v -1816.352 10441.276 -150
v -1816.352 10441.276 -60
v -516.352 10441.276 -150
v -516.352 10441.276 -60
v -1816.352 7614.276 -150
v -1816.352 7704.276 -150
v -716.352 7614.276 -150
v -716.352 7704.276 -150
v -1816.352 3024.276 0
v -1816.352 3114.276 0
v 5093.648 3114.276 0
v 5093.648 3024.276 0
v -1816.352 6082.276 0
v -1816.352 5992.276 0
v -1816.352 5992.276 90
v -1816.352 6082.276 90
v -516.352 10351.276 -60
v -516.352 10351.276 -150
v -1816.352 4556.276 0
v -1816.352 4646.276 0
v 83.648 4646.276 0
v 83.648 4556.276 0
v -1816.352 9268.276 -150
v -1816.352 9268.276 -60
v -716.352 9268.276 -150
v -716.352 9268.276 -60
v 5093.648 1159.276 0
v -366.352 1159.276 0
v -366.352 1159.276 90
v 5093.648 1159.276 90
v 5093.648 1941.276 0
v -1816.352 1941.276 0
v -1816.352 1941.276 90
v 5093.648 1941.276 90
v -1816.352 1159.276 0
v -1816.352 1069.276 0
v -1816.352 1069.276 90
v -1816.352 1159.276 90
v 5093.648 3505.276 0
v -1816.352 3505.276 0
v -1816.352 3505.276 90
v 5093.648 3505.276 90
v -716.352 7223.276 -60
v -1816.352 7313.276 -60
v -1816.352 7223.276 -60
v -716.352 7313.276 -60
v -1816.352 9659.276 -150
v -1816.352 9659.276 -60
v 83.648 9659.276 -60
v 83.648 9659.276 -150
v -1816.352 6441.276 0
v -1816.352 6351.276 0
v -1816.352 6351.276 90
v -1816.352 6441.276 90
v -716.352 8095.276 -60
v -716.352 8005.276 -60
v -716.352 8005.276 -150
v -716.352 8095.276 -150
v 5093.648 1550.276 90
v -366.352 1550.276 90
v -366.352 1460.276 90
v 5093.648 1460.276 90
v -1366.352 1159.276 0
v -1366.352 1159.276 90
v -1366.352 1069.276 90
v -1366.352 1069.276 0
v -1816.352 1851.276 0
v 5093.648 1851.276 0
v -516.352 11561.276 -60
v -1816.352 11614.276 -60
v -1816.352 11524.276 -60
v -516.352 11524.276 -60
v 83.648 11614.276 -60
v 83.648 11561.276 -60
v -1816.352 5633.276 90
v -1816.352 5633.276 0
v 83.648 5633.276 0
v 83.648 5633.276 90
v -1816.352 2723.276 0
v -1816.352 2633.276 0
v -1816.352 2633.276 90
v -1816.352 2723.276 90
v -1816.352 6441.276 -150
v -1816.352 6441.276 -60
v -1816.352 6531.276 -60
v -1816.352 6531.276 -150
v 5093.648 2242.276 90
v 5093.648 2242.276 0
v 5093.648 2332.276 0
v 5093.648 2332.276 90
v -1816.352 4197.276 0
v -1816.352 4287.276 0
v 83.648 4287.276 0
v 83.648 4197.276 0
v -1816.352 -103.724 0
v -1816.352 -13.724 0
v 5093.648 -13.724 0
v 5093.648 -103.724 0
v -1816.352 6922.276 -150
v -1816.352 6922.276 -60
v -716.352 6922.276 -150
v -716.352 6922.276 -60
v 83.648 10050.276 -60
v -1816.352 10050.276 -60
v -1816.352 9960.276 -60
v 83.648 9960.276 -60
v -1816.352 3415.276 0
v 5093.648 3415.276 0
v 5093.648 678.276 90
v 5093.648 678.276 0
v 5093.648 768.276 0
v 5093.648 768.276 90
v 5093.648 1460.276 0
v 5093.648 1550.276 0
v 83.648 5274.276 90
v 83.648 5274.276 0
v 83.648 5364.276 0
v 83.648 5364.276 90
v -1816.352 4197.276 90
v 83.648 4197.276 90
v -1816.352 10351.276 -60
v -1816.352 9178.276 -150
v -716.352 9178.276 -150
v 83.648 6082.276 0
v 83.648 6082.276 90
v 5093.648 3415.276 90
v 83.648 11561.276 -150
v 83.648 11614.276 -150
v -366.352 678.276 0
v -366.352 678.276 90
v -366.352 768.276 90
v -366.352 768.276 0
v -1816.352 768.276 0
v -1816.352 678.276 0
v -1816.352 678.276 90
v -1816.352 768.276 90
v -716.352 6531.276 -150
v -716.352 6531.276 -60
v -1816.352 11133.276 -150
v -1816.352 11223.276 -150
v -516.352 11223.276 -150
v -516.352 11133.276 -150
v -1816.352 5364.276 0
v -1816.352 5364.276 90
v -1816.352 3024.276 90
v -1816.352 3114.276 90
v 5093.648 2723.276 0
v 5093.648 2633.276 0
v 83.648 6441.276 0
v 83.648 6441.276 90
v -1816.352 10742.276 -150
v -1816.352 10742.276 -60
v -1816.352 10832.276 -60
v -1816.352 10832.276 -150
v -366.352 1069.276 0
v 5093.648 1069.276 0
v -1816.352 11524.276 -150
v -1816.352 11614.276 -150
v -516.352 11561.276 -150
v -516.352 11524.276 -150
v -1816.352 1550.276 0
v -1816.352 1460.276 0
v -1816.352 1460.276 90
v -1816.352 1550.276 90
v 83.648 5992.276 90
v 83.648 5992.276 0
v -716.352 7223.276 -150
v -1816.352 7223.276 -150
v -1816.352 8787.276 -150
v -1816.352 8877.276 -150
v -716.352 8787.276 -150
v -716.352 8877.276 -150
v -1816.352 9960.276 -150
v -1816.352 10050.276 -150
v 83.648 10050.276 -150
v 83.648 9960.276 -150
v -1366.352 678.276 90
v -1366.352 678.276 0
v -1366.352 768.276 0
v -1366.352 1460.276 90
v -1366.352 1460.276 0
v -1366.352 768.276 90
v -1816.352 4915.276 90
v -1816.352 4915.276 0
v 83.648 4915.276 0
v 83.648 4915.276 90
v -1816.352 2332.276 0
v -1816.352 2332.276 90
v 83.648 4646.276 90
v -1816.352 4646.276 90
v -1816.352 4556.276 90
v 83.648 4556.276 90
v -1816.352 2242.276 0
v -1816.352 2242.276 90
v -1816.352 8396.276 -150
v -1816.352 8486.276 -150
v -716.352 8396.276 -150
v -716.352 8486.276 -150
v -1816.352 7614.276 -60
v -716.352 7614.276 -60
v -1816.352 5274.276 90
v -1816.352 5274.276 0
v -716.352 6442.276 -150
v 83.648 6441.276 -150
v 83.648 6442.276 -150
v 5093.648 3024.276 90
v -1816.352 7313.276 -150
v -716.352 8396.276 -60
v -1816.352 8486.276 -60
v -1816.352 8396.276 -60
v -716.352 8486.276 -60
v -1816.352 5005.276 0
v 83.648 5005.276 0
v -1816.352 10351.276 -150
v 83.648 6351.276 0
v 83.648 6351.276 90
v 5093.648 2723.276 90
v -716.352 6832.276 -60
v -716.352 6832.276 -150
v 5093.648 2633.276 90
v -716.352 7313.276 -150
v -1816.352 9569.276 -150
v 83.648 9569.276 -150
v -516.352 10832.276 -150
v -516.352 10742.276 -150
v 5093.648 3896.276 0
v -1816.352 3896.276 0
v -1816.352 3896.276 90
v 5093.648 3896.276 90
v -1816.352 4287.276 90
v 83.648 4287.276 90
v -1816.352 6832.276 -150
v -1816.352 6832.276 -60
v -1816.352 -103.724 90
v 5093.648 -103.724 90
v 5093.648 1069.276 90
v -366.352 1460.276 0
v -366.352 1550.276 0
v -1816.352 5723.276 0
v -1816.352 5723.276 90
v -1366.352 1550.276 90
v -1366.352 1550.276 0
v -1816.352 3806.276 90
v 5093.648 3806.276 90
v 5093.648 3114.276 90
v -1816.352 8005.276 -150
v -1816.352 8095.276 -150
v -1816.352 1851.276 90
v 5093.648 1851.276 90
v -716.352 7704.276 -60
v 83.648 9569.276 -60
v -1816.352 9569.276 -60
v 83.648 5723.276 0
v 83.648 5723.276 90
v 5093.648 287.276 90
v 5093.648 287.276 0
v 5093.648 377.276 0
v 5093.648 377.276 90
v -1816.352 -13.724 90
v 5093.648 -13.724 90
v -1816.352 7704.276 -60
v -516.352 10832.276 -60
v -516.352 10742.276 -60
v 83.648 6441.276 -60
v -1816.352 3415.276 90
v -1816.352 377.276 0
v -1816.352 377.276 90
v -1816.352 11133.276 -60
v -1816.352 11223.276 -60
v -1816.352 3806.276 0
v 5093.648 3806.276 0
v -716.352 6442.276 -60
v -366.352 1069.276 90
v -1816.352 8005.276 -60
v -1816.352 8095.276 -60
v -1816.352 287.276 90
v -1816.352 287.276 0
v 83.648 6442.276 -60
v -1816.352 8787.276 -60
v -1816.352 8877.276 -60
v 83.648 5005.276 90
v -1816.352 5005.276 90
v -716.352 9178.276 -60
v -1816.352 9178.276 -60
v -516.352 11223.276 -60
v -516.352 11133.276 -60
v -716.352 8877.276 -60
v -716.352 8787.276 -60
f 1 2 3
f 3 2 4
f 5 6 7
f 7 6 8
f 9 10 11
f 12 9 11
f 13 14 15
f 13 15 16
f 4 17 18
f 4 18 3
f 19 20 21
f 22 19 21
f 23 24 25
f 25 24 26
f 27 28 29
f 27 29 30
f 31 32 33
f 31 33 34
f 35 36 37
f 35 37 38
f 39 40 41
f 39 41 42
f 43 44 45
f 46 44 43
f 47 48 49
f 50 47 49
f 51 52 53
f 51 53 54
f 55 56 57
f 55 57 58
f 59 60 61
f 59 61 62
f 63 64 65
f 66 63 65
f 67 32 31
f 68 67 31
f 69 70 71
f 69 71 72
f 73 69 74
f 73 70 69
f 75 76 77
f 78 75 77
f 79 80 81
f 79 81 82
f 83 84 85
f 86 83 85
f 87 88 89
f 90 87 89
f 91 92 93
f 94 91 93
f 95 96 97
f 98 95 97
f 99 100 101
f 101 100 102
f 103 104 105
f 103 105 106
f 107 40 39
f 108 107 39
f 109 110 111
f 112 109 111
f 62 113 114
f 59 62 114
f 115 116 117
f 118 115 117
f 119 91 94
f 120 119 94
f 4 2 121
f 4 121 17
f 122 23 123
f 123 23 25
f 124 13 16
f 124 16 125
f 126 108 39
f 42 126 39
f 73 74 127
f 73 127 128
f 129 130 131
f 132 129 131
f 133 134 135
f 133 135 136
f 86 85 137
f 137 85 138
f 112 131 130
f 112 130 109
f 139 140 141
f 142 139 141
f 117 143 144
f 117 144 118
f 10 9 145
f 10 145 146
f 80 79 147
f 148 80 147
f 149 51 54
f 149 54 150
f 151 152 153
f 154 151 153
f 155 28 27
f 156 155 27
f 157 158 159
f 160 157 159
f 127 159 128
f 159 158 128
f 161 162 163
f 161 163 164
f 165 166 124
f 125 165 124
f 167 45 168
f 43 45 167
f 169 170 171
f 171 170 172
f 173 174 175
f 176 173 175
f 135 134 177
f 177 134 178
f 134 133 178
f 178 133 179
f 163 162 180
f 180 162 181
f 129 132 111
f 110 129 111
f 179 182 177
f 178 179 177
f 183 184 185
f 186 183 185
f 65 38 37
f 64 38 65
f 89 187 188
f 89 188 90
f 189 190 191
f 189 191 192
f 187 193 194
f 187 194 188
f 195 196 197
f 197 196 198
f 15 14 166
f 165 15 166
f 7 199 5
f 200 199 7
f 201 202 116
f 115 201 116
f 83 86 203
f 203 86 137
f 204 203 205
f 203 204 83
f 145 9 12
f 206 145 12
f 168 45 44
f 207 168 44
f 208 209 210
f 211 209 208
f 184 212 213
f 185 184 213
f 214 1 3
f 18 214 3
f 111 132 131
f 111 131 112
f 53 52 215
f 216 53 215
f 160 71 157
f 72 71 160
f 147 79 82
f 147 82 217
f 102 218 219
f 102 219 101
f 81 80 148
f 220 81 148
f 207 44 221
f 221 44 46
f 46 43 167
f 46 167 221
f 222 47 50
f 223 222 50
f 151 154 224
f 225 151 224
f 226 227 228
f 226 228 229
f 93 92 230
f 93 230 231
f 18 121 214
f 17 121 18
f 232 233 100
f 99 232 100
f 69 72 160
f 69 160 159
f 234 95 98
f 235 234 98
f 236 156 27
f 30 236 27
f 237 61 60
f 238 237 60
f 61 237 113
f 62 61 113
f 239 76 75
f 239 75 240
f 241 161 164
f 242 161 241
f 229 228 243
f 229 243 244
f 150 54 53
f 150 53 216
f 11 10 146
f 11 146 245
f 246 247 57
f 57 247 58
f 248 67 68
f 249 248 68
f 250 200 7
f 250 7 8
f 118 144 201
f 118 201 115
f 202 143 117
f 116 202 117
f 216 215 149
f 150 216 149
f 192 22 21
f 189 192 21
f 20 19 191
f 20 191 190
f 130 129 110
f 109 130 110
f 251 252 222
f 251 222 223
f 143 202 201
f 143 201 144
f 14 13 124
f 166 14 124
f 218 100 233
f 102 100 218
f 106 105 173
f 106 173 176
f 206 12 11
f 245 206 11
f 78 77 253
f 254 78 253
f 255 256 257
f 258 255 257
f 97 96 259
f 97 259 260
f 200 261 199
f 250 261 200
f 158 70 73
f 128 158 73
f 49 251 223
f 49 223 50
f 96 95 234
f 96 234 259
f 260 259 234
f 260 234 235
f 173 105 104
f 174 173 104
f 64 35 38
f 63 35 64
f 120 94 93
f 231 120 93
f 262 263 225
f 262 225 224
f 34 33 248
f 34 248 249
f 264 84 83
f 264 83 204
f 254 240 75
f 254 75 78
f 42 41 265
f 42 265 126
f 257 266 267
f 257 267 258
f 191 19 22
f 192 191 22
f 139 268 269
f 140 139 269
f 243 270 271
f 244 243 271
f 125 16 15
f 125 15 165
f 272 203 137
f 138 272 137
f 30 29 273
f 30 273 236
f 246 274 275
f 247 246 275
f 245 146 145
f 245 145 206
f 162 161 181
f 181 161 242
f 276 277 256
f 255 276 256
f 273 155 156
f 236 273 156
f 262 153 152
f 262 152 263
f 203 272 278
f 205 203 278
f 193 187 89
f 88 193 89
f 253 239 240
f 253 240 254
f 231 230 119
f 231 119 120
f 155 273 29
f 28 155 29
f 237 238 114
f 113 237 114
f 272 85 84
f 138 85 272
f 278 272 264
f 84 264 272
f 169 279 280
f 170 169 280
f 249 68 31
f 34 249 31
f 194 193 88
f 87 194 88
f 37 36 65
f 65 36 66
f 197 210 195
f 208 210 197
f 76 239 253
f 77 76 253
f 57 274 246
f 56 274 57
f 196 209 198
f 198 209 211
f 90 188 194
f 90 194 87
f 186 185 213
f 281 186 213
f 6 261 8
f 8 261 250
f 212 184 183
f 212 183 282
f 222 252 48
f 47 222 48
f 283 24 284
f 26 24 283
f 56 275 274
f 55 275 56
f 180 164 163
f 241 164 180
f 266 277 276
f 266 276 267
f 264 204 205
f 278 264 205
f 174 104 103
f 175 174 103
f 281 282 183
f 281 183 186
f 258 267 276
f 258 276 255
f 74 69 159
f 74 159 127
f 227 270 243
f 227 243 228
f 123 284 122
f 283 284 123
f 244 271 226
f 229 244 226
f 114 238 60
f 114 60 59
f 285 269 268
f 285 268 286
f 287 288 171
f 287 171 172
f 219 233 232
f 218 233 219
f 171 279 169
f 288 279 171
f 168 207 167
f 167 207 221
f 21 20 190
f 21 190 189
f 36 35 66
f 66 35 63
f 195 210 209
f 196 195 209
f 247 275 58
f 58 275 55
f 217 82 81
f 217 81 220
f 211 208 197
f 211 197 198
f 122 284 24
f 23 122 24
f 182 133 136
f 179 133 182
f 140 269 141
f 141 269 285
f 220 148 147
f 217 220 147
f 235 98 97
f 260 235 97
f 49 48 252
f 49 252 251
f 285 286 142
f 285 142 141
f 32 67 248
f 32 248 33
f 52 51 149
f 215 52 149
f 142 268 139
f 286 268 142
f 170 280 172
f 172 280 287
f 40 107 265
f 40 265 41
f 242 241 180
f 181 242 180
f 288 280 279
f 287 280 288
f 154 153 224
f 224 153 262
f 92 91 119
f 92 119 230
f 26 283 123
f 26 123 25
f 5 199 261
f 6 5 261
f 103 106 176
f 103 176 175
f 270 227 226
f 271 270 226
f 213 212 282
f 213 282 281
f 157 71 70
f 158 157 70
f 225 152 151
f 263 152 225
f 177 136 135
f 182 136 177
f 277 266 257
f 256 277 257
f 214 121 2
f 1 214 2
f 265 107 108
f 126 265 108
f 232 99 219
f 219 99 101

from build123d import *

# Parameters (mm, degrees)
F0_W     = 1900
F0_H     = 90
F1_DEPTH = 90
F0_W_2   = 6910
F2_START = -60
F2_DEPTH = 90
F3_W     = 1000
F3_H     = 687
F3_H_2   = 673
F3_W_2   = 800
F3_H_3   = 3110
F3_W_3   = 600
F3_H_4   = 1300
F3_H_5   = 90
F4_DEPTH = 1000


with BuildPart() as f1:
    # F0 (on Top) → F1 (new body)
    with BuildSketch(Plane.XY):
        with Locations((-866.352162238, 6396.2760958672)):
            Rectangle(F0_W, F0_H)
    extrude(amount=F1_DEPTH)


with BuildPart() as f1b:
    # F0 (on Top) → F1, piece 2 (new body)
    with BuildSketch(Plane.XY):
        with Locations((-866.352162238, 6037.2760958672)):
            Rectangle(F0_W, F0_H)
    extrude(amount=F1_DEPTH)


with BuildPart() as f1c:
    # F0 (on Top) → F1, piece 3 (new body)
    with BuildSketch(Plane.XY):
        with Locations((-866.352162238, 5678.2760958672)):
            Rectangle(F0_W, F0_H)
    extrude(amount=F1_DEPTH)


with BuildPart() as f1d:
    # F0 (on Top) → F1, piece 4 (new body)
    with BuildSketch(Plane.XY):
        with Locations((-866.352162238, 5319.2760958672)):
            Rectangle(F0_W, F0_H)
    extrude(amount=F1_DEPTH)


with BuildPart() as f1e:
    # F0 (on Top) → F1, piece 5 (new body)
    with BuildSketch(Plane.XY):
        with Locations((-866.352162238, 4960.2760958672)):
            Rectangle(F0_W, F0_H)
    extrude(amount=F1_DEPTH)


with BuildPart() as f1f:
    # F0 (on Top) → F1, piece 6 (new body)
    with BuildSketch(Plane.XY):
        with Locations((-866.352162238, 4601.2760958672)):
            Rectangle(F0_W, F0_H)
    extrude(amount=F1_DEPTH)


with BuildPart() as f1g:
    # F0 (on Top) → F1, piece 7 (new body)
    with BuildSketch(Plane.XY):
        with Locations((-866.352162238, 4242.2760958672)):
            Rectangle(F0_W, F0_H)
    extrude(amount=F1_DEPTH)


with BuildPart() as f1h:
    # F0 (on Top) → F1, piece 8 (new body)
    with BuildSketch(Plane.XY):
        with Locations((1638.647837762, 3851.2760958672)):
            Rectangle(F0_W_2, F0_H)
    extrude(amount=F1_DEPTH)


with BuildPart() as f1i:
    # F0 (on Top) → F1, piece 9 (new body)
    with BuildSketch(Plane.XY):
        with Locations((1638.647837762, 3460.2760958672)):
            Rectangle(F0_W_2, F0_H)
    extrude(amount=F1_DEPTH)


with BuildPart() as f1j:
    # F0 (on Top) → F1, piece 10 (new body)
    with BuildSketch(Plane.XY):
        with Locations((1638.647837762, 3069.2760958672)):
            Rectangle(F0_W_2, F0_H)
    extrude(amount=F1_DEPTH)


with BuildPart() as f1k:
    # F0 (on Top) → F1, piece 11 (new body)
    with BuildSketch(Plane.XY):
        with Locations((1638.647837762, 2678.2760958672)):
            Rectangle(F0_W_2, F0_H)
    extrude(amount=F1_DEPTH)


with BuildPart() as f1l:
    # F0 (on Top) → F1, piece 12 (new body)
    with BuildSketch(Plane.XY):
        with Locations((1638.647837762, 2287.2760958672)):
            Rectangle(F0_W_2, F0_H)
    extrude(amount=F1_DEPTH)


with BuildPart() as f1m:
    # F0 (on Top) → F1, piece 13 (new body)
    with BuildSketch(Plane.XY):
        with Locations((1638.647837762, 1896.2760958672)):
            Rectangle(F0_W_2, F0_H)
    extrude(amount=F1_DEPTH)


with BuildPart() as f1n:
    # F0 (on Top) → F1, piece 14 (new body)
    with BuildSketch(Plane.XY):
        with Locations((1638.647837762, 1505.2760958672)):
            Rectangle(F0_W_2, F0_H)
    extrude(amount=F1_DEPTH)


with BuildPart() as f1o:
    # F0 (on Top) → F1, piece 15 (new body)
    with BuildSketch(Plane.XY):
        with Locations((1638.647837762, 1114.2760958672)):
            Rectangle(F0_W_2, F0_H)
    extrude(amount=F1_DEPTH)


with BuildPart() as f1p:
    # F0 (on Top) → F1, piece 16 (new body)
    with BuildSketch(Plane.XY):
        with Locations((1638.647837762, 723.2760958672)):
            Rectangle(F0_W_2, F0_H)
    extrude(amount=F1_DEPTH)


with BuildPart() as f1q:
    # F0 (on Top) → F1, piece 17 (new body)
    with BuildSketch(Plane.XY):
        with Locations((1638.647837762, 332.2760958672)):
            Rectangle(F0_W_2, F0_H)
    extrude(amount=F1_DEPTH)


with BuildPart() as f1r:
    # F0 (on Top) → F1, piece 18 (new body)
    with BuildSketch(Plane.XY):
        with Locations((1638.647837762, -58.7239041328)):
            Rectangle(F0_W_2, F0_H)
    extrude(amount=F1_DEPTH)


with BuildPart() as f2:
    # F0 (on Top) → F2 (new body)
    with BuildSketch(Plane.XY.offset(F2_START)):
        with Locations((-866.352162238, 6486.2760958672)):
            Rectangle(F0_W, F0_H)
    extrude(amount=-F2_DEPTH)


with BuildPart() as f2b:
    # F0 (on Top) → F2, piece 2 (new body)
    with BuildSketch(Plane.XY.offset(F2_START)):
        with Locations((-866.352162238, 6877.2760958672)):
            Rectangle(F0_W, F0_H)
    extrude(amount=-F2_DEPTH)


with BuildPart() as f2c:
    # F0 (on Top) → F2, piece 3 (new body)
    with BuildSketch(Plane.XY.offset(F2_START)):
        with Locations((-866.352162238, 7268.2760958672)):
            Rectangle(F0_W, F0_H)
    extrude(amount=-F2_DEPTH)


with BuildPart() as f2d:
    # F0 (on Top) → F2, piece 4 (new body)
    with BuildSketch(Plane.XY.offset(F2_START)):
        with Locations((-866.352162238, 7659.2760958672)):
            Rectangle(F0_W, F0_H)
    extrude(amount=-F2_DEPTH)


with BuildPart() as f2e:
    # F0 (on Top) → F2, piece 5 (new body)
    with BuildSketch(Plane.XY.offset(F2_START)):
        with Locations((-866.352162238, 8050.2760958672)):
            Rectangle(F0_W, F0_H)
    extrude(amount=-F2_DEPTH)


with BuildPart() as f2f:
    # F0 (on Top) → F2, piece 6 (new body)
    with BuildSketch(Plane.XY.offset(F2_START)):
        with Locations((-866.352162238, 8441.2760958672)):
            Rectangle(F0_W, F0_H)
    extrude(amount=-F2_DEPTH)


with BuildPart() as f2g:
    # F0 (on Top) → F2, piece 7 (new body)
    with BuildSketch(Plane.XY.offset(F2_START)):
        with Locations((-866.352162238, 8832.2760958672)):
            Rectangle(F0_W, F0_H)
    extrude(amount=-F2_DEPTH)


with BuildPart() as f2h:
    # F0 (on Top) → F2, piece 8 (new body)
    with BuildSketch(Plane.XY.offset(F2_START)):
        with Locations((-866.352162238, 9223.2760958672)):
            Rectangle(F0_W, F0_H)
    extrude(amount=-F2_DEPTH)


with BuildPart() as f2i:
    # F0 (on Top) → F2, piece 9 (new body)
    with BuildSketch(Plane.XY.offset(F2_START)):
        with Locations((-866.352162238, 9614.2760958672)):
            Rectangle(F0_W, F0_H)
    extrude(amount=-F2_DEPTH)


with BuildPart() as f2j:
    # F0 (on Top) → F2, piece 10 (new body)
    with BuildSketch(Plane.XY.offset(F2_START)):
        with Locations((-866.352162238, 10005.2760958672)):
            Rectangle(F0_W, F0_H)
    extrude(amount=-F2_DEPTH)


with BuildPart() as f2k:
    # F0 (on Top) → F2, piece 11 (new body)
    with BuildSketch(Plane.XY.offset(F2_START)):
        with Locations((-866.352162238, 10396.2760958672)):
            Rectangle(F0_W, F0_H)
    extrude(amount=-F2_DEPTH)


with BuildPart() as f2l:
    # F0 (on Top) → F2, piece 12 (new body)
    with BuildSketch(Plane.XY.offset(F2_START)):
        with Locations((-866.352162238, 10787.2760958672)):
            Rectangle(F0_W, F0_H)
    extrude(amount=-F2_DEPTH)


with BuildPart() as f2m:
    # F0 (on Top) → F2, piece 13 (new body)
    with BuildSketch(Plane.XY.offset(F2_START)):
        with Locations((-866.352162238, 11178.2760958672)):
            Rectangle(F0_W, F0_H)
    extrude(amount=-F2_DEPTH)


with BuildPart() as f2n:
    # F0 (on Top) → F2, piece 14 (new body)
    with BuildSketch(Plane.XY.offset(F2_START)):
        with Locations((-866.352162238, 11569.2760958672)):
            Rectangle(F0_W, F0_H)
    extrude(amount=-F2_DEPTH)


with BuildPart() as f4_tool:
    # F3 (on face) → F4 (new body)
    with BuildSketch(Plane.XY.offset(90)):
        with Locations((-866.352162238, 1502.7760958672)):
            Rectangle(F3_W, F3_H)
        with Locations((-866.352162238, 732.7760958672)):
            Rectangle(F3_W, F3_H_2)
        with Locations((-316.352162238, 7997.2760958672)):
            Rectangle(F3_W_2, F3_H_3)
        with Locations((-216.352162238, 10911.2760958672)):
            Rectangle(F3_W_3, F3_H_4)
        with Locations((-866.352162238, 1114.2760958672)):
            Rectangle(F3_W, F3_H_5)
    extrude(amount=-F4_DEPTH)


with BuildPart() as f1n_1:
    add(f1n.part)

    # F4: cut by f4_tool
    add(f4_tool.part, mode=Mode.SUBTRACT)


with BuildPart() as f1o_1:
    add(f1o.part)

    # F4: cut by f4_tool
    add(f4_tool.part, mode=Mode.SUBTRACT)


with BuildPart() as f1p_1:
    add(f1p.part)

    # F4: cut by f4_tool
    add(f4_tool.part, mode=Mode.SUBTRACT)


with BuildPart() as f2_1:
    add(f2.part)

    # F4: cut by f4_tool
    add(f4_tool.part, mode=Mode.SUBTRACT)


with BuildPart() as f2b_1:
    add(f2b.part)

    # F4: cut by f4_tool
    add(f4_tool.part, mode=Mode.SUBTRACT)


with BuildPart() as f2c_1:
    add(f2c.part)

    # F4: cut by f4_tool
    add(f4_tool.part, mode=Mode.SUBTRACT)


with BuildPart() as f2d_1:
    add(f2d.part)

    # F4: cut by f4_tool
    add(f4_tool.part, mode=Mode.SUBTRACT)


with BuildPart() as f2e_1:
    add(f2e.part)

    # F4: cut by f4_tool
    add(f4_tool.part, mode=Mode.SUBTRACT)


with BuildPart() as f2f_1:
    add(f2f.part)

    # F4: cut by f4_tool
    add(f4_tool.part, mode=Mode.SUBTRACT)


with BuildPart() as f2g_1:
    add(f2g.part)

    # F4: cut by f4_tool
    add(f4_tool.part, mode=Mode.SUBTRACT)


with BuildPart() as f2h_1:
    add(f2h.part)

    # F4: cut by f4_tool
    add(f4_tool.part, mode=Mode.SUBTRACT)


with BuildPart() as f2k_1:
    add(f2k.part)

    # F4: cut by f4_tool
    add(f4_tool.part, mode=Mode.SUBTRACT)


with BuildPart() as f2l_1:
    add(f2l.part)

    # F4: cut by f4_tool
    add(f4_tool.part, mode=Mode.SUBTRACT)


with BuildPart() as f2m_1:
    add(f2m.part)

    # F4: cut by f4_tool
    add(f4_tool.part, mode=Mode.SUBTRACT)


with BuildPart() as f2n_1:
    add(f2n.part)

    # F4: cut by f4_tool
    add(f4_tool.part, mode=Mode.SUBTRACT)


solid = Compound([f1.part, f1b.part, f1c.part, f1d.part, f1e.part, f1f.part, f1g.part, f1h.part, f1i.part, f1j.part, f1k.part, f1l.part, f1m.part, f1q.part, f1r.part, f2i.part, f2j.part, f1n_1.part, f1o_1.part, f1p_1.part, f2_1.part, f2b_1.part, f2c_1.part, f2d_1.part, f2e_1.part, f2f_1.part, f2g_1.part, f2h_1.part, f2k_1.part, f2l_1.part, f2m_1.part, f2n_1.part])
